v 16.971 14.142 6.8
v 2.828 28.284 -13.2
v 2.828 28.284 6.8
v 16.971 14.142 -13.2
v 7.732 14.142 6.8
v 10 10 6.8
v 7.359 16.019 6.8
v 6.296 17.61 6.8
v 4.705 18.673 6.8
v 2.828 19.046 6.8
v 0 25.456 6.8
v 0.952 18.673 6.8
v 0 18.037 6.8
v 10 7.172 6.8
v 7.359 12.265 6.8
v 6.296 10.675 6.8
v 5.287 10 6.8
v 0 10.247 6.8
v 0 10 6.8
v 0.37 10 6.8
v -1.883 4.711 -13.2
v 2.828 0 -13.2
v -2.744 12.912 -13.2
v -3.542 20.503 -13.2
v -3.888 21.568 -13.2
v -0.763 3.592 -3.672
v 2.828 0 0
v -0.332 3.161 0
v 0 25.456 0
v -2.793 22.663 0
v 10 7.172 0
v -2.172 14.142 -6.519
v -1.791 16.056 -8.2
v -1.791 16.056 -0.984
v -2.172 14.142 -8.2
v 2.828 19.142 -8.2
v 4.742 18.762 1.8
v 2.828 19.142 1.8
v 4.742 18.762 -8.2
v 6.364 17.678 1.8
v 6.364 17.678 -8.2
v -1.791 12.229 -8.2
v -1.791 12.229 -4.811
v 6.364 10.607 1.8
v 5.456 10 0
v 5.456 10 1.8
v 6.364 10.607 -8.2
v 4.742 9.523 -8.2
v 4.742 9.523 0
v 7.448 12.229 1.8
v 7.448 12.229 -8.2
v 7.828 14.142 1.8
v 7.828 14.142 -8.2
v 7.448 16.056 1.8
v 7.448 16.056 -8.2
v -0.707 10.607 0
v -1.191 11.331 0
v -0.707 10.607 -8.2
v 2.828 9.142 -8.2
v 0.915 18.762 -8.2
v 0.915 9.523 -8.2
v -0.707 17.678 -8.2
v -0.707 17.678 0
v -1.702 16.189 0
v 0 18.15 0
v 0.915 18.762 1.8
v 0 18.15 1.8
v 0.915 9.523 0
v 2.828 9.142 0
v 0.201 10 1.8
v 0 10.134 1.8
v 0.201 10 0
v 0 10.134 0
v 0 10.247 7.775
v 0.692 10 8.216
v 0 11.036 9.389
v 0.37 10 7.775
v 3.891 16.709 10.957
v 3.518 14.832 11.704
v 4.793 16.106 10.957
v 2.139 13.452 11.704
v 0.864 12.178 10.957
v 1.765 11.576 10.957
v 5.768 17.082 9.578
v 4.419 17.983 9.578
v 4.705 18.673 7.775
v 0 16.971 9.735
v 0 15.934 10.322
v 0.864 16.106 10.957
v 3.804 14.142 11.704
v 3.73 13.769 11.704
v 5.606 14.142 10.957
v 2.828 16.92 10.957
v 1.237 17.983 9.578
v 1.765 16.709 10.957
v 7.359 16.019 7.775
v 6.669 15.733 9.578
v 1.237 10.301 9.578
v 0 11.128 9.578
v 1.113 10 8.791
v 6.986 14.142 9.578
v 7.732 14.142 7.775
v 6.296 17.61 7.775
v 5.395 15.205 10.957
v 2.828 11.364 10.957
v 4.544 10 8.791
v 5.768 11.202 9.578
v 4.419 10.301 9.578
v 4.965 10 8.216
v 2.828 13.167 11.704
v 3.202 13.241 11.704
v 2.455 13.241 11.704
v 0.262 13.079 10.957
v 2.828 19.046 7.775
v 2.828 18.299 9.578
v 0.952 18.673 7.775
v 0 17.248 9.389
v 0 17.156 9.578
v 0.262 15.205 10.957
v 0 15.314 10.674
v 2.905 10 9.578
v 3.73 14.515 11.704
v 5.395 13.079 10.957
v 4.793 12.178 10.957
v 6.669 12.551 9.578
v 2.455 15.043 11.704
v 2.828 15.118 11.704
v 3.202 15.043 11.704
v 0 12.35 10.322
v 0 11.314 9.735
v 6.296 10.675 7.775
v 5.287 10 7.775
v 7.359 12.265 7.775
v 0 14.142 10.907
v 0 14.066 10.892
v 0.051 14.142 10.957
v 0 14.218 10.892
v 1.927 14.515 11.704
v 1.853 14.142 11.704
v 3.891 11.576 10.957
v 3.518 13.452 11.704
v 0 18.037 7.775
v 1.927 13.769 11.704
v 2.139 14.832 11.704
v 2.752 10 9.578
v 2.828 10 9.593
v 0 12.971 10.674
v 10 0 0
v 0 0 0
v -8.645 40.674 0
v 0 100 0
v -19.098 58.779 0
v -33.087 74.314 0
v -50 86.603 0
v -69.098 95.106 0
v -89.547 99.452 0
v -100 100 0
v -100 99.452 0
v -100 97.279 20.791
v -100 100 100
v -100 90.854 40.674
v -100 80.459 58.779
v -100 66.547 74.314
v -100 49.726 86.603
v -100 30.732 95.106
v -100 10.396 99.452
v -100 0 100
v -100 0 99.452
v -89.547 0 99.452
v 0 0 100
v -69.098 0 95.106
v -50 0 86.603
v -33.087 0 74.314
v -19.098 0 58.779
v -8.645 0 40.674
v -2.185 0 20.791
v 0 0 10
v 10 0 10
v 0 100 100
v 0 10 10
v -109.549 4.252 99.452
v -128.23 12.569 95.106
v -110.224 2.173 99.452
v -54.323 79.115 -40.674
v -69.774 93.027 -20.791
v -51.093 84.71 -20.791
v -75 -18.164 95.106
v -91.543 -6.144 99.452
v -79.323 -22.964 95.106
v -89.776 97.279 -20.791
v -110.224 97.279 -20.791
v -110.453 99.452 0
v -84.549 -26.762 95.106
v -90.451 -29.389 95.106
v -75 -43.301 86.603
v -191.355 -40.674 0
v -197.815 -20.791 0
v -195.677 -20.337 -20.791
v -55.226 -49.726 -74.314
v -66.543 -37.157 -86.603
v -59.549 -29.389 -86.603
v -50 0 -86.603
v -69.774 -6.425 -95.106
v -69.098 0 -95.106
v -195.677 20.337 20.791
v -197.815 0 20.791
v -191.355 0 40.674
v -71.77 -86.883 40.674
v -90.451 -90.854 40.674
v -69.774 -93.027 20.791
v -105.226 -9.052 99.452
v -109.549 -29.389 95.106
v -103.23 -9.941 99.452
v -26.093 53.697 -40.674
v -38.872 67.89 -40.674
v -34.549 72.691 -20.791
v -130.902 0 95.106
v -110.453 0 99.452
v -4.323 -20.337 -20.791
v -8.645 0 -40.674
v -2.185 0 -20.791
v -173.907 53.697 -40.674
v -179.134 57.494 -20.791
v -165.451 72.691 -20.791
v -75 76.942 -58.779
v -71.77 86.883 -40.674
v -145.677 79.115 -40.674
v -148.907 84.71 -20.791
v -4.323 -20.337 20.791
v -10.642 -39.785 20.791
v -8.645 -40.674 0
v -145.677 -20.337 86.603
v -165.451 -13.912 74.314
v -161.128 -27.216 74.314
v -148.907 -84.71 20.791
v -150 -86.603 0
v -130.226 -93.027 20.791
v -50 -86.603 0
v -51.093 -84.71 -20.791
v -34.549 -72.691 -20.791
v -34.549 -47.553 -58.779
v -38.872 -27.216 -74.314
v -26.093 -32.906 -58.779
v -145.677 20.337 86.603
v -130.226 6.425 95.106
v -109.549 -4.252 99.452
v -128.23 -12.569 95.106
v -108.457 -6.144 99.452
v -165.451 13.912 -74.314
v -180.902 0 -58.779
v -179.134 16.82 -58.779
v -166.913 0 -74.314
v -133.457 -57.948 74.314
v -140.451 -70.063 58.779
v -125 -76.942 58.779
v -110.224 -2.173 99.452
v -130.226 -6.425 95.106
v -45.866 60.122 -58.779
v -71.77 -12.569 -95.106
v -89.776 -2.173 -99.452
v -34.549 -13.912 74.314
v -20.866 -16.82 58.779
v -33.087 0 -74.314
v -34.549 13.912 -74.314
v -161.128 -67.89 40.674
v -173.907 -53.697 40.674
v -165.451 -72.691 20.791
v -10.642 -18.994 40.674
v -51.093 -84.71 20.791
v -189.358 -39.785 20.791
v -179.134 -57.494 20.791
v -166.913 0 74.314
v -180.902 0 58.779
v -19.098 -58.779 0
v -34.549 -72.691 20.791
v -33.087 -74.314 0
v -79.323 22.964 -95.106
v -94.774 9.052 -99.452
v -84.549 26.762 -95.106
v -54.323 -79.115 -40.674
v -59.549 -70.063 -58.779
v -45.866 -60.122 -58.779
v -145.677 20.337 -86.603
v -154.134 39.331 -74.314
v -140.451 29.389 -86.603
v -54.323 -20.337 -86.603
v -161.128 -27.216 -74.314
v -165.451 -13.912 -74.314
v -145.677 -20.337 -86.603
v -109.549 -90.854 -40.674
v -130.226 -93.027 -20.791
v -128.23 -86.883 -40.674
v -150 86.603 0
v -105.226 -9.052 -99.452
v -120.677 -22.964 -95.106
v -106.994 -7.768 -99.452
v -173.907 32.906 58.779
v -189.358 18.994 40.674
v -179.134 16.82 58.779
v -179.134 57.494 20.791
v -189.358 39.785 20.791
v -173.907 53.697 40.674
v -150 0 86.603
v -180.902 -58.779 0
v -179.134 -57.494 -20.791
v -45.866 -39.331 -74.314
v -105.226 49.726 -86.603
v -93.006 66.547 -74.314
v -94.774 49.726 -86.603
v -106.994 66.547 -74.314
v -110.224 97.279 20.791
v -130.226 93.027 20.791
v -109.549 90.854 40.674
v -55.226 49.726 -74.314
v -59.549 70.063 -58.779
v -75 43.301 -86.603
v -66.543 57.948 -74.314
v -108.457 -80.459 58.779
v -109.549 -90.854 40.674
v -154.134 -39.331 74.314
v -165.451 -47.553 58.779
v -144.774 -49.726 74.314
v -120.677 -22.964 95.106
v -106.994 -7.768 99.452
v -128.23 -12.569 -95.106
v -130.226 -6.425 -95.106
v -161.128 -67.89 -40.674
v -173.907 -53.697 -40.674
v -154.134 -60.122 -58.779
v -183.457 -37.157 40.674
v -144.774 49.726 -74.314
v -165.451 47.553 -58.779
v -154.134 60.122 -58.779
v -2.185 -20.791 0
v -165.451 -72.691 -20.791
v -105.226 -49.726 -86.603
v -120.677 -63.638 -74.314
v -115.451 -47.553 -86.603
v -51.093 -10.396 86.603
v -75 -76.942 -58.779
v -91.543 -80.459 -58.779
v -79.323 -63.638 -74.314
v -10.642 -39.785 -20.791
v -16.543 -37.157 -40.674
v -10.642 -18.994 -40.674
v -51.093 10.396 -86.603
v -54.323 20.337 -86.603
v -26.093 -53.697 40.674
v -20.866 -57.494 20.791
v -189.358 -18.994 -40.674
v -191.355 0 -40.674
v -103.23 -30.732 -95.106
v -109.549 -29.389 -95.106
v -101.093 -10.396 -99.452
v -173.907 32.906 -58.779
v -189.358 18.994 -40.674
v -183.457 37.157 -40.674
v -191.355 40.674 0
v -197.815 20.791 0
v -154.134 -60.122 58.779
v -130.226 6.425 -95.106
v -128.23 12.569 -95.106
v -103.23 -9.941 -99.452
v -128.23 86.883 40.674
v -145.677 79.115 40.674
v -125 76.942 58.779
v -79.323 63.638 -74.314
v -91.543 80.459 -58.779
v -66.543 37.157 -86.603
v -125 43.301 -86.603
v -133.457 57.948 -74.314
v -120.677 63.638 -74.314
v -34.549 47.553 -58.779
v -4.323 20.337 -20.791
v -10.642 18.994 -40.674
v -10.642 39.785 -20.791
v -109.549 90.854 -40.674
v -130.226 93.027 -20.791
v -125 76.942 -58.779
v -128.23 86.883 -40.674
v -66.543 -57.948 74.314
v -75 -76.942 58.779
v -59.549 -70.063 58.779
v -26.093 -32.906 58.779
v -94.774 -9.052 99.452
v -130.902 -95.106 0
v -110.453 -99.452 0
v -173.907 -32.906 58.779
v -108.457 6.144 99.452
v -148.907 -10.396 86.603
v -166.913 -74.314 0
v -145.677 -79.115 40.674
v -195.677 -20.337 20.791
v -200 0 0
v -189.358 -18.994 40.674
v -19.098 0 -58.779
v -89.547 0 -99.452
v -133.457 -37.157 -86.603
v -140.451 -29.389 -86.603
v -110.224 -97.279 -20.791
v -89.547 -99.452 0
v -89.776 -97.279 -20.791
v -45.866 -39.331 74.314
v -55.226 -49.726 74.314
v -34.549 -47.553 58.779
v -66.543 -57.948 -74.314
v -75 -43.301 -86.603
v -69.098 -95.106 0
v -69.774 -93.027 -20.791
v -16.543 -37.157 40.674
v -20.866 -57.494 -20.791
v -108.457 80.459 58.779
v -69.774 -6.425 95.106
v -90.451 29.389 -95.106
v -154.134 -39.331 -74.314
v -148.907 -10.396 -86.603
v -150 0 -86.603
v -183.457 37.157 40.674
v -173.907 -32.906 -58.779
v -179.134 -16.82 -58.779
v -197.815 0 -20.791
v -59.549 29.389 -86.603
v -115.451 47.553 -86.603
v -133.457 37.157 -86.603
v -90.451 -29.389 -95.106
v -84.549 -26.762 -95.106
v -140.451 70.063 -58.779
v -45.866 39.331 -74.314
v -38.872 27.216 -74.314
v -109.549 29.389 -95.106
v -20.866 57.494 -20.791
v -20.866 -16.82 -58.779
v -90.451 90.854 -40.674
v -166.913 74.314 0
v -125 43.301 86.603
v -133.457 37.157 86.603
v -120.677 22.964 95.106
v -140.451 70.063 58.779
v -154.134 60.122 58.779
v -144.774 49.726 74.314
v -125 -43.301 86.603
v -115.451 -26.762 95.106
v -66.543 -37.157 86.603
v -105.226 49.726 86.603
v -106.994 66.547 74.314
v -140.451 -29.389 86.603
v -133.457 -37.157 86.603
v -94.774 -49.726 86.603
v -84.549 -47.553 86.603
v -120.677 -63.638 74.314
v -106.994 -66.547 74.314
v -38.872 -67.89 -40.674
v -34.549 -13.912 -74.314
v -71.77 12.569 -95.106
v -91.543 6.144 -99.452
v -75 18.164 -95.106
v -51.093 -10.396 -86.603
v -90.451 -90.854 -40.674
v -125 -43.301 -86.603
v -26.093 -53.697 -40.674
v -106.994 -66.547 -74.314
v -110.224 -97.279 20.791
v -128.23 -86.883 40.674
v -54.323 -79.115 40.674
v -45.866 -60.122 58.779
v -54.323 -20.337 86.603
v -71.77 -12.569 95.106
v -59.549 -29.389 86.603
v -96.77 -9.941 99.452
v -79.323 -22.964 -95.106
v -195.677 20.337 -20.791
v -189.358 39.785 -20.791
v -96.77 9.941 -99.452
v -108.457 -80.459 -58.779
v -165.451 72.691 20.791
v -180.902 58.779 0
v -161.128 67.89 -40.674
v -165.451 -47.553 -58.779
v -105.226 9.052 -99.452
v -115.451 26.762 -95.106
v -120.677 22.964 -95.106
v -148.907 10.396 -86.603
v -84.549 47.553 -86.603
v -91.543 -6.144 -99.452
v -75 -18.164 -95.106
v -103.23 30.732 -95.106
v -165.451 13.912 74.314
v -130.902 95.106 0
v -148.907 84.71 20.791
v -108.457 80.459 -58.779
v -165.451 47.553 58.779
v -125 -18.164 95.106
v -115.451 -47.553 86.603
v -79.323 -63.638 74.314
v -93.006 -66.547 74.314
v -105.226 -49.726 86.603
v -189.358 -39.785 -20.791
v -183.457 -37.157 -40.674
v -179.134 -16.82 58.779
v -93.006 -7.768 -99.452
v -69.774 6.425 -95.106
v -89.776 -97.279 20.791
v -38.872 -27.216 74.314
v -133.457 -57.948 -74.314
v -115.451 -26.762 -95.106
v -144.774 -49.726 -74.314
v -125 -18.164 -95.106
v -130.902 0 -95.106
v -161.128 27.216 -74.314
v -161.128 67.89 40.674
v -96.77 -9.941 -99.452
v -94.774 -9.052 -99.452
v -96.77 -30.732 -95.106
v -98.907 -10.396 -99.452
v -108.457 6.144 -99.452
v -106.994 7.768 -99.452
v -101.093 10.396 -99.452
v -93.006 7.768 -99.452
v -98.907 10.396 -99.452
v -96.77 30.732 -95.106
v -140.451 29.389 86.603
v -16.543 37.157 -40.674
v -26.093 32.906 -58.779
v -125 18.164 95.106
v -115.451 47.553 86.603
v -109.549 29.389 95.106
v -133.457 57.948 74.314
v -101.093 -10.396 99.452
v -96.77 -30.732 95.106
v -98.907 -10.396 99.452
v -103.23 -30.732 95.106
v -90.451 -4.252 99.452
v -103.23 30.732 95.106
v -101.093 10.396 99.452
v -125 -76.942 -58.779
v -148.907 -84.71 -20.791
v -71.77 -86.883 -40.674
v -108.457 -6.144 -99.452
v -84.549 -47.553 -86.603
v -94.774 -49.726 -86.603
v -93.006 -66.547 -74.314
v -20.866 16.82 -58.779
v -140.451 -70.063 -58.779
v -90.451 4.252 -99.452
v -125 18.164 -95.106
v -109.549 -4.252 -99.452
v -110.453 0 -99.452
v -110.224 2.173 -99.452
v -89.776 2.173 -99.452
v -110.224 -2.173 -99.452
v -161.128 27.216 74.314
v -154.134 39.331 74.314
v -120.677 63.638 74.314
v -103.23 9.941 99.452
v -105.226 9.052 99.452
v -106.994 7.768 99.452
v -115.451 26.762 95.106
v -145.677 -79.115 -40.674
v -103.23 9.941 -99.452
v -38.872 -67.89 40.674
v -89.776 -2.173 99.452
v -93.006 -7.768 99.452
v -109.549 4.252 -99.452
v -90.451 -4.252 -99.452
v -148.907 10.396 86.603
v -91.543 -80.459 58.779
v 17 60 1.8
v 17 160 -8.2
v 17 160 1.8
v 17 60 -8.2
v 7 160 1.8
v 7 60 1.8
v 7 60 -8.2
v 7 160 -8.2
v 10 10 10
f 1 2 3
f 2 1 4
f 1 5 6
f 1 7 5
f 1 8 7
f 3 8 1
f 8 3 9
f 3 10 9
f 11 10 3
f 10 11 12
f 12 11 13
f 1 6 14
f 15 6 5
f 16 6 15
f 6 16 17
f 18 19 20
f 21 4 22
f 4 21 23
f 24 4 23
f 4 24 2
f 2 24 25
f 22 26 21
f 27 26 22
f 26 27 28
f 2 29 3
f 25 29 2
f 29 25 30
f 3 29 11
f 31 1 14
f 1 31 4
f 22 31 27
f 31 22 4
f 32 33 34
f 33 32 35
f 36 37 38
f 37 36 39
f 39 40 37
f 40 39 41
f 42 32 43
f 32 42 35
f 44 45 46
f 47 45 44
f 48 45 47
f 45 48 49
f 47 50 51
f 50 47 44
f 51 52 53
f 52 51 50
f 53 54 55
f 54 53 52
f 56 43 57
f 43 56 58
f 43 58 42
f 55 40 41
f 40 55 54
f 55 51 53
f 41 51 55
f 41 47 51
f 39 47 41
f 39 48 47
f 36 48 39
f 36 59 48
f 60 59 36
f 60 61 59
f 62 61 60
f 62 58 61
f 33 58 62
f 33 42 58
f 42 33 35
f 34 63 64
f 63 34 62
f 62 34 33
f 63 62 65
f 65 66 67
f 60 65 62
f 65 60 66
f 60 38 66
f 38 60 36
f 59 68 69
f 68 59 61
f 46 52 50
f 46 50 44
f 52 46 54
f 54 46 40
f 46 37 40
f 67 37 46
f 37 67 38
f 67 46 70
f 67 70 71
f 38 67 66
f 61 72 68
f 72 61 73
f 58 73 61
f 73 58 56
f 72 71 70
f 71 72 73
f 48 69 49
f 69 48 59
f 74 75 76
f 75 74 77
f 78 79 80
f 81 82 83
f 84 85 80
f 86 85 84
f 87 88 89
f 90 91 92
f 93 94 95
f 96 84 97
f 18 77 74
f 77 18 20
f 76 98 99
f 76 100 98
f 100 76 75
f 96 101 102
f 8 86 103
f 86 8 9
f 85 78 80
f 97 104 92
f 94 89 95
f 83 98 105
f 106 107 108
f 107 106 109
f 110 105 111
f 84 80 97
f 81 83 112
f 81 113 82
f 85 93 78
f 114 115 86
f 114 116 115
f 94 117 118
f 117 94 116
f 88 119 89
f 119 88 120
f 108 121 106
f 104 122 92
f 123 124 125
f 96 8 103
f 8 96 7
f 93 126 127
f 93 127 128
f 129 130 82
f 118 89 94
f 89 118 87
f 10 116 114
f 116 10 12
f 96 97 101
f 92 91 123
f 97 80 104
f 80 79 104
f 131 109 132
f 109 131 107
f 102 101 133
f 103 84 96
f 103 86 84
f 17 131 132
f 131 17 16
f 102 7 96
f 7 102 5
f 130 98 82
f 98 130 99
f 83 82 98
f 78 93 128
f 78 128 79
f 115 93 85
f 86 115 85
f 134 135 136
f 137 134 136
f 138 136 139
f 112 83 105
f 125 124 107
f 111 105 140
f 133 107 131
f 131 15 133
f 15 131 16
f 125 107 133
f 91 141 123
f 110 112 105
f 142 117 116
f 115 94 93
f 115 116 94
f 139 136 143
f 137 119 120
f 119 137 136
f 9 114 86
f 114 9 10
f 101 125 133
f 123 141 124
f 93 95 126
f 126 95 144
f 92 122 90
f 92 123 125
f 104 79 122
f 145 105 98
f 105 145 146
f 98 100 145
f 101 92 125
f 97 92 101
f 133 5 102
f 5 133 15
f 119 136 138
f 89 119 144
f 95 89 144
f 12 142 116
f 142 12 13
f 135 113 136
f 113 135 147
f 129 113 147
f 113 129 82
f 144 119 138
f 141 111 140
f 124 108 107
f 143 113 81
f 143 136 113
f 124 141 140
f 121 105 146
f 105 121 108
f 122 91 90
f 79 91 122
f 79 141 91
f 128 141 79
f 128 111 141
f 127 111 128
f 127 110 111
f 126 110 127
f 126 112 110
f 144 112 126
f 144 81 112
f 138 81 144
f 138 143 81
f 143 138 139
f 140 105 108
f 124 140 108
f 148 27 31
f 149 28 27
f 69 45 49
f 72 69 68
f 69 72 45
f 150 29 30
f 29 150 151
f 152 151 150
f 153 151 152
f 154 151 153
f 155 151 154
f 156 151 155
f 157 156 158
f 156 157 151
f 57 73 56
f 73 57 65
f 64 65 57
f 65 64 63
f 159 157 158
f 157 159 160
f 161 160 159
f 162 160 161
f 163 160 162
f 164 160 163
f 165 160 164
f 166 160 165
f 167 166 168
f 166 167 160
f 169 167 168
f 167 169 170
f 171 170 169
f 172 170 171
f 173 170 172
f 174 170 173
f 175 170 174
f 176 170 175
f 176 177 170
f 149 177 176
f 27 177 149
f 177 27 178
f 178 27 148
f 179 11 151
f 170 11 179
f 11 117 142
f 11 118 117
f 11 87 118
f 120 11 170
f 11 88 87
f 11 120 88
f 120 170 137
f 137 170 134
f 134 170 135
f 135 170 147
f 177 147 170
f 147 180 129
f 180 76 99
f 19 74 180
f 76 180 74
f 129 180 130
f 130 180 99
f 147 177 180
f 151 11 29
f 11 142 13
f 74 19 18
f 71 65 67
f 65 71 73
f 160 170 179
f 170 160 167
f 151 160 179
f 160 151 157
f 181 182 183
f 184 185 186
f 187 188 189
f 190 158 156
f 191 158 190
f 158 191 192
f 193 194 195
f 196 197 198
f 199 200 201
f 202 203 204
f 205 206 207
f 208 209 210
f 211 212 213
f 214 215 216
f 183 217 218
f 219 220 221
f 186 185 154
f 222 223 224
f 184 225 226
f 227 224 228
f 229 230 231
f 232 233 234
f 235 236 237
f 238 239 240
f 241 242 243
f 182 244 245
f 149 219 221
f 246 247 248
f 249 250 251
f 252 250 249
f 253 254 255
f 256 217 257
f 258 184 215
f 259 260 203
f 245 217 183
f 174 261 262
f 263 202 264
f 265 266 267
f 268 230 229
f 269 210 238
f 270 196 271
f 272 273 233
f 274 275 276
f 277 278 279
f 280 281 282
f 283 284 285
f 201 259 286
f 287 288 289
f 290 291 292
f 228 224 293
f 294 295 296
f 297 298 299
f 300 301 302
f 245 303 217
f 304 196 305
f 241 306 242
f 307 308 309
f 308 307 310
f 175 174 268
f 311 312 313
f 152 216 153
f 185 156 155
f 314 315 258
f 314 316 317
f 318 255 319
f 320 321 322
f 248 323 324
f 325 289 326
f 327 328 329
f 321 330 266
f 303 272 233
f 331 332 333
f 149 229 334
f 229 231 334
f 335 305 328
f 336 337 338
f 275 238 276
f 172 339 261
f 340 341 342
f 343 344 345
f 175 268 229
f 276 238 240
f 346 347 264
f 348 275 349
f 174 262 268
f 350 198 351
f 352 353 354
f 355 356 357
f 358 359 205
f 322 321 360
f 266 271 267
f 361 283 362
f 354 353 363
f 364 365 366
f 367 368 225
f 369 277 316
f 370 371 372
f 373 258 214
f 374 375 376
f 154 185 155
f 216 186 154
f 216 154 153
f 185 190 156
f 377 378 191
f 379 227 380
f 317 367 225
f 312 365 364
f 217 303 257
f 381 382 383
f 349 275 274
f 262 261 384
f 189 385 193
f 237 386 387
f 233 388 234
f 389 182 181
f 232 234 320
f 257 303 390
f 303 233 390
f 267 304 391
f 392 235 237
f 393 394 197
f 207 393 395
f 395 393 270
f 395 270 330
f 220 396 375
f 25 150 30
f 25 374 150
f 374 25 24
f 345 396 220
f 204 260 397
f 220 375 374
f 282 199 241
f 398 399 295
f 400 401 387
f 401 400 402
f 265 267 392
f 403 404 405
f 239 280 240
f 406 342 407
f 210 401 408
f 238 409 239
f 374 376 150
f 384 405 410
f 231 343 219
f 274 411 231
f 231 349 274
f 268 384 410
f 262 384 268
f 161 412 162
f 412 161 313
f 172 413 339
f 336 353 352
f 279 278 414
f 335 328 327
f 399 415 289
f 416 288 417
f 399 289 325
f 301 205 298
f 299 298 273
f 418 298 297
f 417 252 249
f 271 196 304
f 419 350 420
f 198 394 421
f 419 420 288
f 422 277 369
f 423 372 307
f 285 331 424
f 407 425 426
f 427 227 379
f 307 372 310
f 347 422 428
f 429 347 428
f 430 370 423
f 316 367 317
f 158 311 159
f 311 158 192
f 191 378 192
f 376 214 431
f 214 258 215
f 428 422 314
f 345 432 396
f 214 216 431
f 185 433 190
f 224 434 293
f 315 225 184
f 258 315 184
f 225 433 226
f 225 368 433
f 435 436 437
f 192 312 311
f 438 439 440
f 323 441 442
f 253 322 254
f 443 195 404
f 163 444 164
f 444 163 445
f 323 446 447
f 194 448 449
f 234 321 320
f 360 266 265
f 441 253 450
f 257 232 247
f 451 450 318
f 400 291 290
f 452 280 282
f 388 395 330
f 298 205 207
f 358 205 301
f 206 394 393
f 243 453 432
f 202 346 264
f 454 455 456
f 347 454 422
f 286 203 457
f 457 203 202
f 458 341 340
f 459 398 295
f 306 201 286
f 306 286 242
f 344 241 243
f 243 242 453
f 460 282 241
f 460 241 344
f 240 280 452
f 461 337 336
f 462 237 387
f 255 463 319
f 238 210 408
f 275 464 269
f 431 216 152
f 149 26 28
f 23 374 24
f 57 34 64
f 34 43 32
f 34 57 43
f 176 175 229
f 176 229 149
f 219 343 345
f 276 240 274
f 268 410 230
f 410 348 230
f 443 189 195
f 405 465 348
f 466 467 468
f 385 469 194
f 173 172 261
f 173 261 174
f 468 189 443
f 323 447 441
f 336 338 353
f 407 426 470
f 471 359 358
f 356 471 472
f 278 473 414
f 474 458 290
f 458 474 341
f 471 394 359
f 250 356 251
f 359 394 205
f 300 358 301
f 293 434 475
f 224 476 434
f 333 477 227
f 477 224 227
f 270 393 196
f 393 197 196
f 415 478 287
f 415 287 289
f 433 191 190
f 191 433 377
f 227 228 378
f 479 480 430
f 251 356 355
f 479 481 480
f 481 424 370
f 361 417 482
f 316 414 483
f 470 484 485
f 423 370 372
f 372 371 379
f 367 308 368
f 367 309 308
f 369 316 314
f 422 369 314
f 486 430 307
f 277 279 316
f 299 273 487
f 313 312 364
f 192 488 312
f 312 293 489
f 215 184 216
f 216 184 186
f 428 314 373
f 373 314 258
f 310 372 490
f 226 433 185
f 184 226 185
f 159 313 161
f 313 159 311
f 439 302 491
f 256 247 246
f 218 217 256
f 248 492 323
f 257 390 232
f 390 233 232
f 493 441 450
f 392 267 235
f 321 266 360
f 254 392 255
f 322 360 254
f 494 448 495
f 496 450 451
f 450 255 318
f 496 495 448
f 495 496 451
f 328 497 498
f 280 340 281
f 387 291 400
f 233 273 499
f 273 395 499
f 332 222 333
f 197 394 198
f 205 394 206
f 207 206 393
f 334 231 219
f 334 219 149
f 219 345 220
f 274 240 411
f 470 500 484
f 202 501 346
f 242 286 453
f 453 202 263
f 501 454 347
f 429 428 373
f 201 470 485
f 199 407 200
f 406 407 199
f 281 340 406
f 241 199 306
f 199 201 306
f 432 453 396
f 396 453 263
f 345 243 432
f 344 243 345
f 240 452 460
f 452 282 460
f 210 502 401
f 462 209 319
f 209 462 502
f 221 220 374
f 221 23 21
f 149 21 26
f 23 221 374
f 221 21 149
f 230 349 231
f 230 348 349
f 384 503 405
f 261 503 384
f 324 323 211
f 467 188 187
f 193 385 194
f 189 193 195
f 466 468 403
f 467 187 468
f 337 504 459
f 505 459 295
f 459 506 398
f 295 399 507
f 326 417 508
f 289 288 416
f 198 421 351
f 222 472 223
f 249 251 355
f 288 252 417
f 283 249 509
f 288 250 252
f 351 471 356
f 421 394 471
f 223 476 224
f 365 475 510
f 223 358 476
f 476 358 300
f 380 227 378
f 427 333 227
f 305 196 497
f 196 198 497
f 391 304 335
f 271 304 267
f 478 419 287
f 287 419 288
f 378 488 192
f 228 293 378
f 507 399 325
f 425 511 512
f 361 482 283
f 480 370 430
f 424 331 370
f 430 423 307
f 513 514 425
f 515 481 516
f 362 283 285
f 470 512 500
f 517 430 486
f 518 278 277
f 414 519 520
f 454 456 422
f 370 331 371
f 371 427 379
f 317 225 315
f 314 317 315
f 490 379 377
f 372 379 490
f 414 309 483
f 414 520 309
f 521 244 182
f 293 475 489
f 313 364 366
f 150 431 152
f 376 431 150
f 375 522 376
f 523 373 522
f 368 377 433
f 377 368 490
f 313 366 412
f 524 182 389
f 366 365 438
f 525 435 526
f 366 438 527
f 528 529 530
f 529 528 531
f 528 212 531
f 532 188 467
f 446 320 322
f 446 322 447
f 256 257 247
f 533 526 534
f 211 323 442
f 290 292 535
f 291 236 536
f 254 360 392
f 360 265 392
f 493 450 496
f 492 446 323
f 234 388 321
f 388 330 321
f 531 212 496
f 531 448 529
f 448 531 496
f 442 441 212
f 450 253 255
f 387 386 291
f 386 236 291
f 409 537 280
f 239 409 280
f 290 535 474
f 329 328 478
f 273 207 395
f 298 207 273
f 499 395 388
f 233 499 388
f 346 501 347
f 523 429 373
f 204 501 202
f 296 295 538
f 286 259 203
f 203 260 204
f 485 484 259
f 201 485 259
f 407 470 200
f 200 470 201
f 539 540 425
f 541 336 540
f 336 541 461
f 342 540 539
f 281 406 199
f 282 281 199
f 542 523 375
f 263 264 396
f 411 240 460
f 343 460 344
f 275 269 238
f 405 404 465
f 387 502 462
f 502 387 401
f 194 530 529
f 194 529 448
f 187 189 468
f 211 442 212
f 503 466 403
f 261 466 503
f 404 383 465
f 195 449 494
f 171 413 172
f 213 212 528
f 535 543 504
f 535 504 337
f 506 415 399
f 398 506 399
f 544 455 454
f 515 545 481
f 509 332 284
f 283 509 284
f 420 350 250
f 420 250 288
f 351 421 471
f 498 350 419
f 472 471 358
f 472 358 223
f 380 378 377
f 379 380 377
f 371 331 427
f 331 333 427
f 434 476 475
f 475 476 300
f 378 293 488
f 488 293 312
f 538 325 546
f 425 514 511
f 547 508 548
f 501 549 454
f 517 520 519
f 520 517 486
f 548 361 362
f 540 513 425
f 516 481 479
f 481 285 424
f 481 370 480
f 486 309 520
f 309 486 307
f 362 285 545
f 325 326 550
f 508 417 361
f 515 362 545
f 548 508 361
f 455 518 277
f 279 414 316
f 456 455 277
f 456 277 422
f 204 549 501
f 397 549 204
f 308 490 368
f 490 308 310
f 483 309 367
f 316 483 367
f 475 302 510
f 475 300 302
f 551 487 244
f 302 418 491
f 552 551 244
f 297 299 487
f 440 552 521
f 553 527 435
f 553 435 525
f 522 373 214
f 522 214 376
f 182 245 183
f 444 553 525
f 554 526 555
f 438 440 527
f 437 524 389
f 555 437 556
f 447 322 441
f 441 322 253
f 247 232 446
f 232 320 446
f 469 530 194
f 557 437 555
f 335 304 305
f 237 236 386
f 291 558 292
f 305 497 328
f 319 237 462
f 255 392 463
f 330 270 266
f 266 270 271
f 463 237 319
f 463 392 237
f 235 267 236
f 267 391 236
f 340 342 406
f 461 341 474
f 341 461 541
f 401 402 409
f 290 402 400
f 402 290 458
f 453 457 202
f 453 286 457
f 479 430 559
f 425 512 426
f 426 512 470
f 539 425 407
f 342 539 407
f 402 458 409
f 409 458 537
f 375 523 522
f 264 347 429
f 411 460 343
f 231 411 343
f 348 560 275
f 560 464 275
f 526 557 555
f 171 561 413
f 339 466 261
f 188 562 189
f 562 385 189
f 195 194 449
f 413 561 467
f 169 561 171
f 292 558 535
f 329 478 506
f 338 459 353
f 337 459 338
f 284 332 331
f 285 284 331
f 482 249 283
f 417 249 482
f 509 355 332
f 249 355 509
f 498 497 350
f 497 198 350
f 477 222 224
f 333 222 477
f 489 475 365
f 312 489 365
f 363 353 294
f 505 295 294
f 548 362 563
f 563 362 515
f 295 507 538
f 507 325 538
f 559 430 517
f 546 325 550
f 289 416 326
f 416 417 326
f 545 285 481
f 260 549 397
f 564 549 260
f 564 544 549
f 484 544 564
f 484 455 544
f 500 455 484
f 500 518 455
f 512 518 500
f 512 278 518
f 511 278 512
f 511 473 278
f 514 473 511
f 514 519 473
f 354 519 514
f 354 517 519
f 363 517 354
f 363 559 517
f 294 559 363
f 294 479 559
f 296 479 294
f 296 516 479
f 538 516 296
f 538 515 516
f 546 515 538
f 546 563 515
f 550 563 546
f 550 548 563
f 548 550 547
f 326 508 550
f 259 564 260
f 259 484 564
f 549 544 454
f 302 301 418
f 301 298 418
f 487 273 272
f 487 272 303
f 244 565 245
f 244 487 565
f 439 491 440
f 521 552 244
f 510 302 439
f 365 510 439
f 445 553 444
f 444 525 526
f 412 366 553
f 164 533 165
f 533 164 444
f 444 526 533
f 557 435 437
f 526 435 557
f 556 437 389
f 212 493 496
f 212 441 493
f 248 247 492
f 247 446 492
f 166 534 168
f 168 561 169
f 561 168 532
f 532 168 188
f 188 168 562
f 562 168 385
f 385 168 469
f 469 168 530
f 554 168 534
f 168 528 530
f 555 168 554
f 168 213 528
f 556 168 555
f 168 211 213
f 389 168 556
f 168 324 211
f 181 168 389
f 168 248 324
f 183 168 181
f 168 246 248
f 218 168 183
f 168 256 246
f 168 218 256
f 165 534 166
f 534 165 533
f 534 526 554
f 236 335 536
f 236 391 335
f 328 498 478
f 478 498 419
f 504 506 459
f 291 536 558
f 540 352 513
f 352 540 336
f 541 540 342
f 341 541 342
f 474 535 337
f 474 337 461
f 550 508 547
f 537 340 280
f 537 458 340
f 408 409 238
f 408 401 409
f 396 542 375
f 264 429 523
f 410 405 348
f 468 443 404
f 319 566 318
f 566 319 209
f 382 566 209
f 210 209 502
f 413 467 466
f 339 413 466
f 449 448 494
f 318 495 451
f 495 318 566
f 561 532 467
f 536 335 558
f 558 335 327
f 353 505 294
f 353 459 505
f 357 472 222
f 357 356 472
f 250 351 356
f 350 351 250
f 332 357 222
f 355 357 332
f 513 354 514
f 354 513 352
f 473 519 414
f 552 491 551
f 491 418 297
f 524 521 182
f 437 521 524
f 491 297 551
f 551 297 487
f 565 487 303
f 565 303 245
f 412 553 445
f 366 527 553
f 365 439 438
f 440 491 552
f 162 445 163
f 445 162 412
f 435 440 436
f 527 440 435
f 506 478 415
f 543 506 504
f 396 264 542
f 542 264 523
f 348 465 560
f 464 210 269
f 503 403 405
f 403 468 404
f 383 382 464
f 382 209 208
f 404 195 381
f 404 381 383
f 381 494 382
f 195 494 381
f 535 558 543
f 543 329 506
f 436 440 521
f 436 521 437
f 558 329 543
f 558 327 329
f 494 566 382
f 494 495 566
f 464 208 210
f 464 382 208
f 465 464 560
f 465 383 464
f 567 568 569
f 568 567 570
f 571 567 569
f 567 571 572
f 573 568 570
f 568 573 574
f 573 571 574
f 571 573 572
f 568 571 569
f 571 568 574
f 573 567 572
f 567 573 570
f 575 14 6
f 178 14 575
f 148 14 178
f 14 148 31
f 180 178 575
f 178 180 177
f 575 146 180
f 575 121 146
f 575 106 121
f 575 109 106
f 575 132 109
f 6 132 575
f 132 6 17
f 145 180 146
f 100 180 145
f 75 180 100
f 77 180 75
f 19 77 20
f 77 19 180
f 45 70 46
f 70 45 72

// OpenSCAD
var1 = (10+20)/3;
var2 = ( var1 + 2 ) / 2;

scale([1,var1,1])
    translate([12,11,-3.2])
        cube([10,10,10], center=true);
rotate([0,0,45])
    translate([12, var2+2, -3.2]) {
        difference() {
            cube(20, center=true);
            cylinder(r=5, h=10, center=true);
        }
        translate([0,0,10]) sphere(5);  //single-line comment
    }

 /* multi
 line
 comment */

translate([-100,0,0]) {
    cube(1);
    cube(100);
    {
        sphere(100);
    }
}

module SomeName(arg1, arg2=10 /*default value */)
{
    difference() {
        cube(arg1);
        sphere(arg2);
    }
}


let(x=10) {
    cube(x);
}
